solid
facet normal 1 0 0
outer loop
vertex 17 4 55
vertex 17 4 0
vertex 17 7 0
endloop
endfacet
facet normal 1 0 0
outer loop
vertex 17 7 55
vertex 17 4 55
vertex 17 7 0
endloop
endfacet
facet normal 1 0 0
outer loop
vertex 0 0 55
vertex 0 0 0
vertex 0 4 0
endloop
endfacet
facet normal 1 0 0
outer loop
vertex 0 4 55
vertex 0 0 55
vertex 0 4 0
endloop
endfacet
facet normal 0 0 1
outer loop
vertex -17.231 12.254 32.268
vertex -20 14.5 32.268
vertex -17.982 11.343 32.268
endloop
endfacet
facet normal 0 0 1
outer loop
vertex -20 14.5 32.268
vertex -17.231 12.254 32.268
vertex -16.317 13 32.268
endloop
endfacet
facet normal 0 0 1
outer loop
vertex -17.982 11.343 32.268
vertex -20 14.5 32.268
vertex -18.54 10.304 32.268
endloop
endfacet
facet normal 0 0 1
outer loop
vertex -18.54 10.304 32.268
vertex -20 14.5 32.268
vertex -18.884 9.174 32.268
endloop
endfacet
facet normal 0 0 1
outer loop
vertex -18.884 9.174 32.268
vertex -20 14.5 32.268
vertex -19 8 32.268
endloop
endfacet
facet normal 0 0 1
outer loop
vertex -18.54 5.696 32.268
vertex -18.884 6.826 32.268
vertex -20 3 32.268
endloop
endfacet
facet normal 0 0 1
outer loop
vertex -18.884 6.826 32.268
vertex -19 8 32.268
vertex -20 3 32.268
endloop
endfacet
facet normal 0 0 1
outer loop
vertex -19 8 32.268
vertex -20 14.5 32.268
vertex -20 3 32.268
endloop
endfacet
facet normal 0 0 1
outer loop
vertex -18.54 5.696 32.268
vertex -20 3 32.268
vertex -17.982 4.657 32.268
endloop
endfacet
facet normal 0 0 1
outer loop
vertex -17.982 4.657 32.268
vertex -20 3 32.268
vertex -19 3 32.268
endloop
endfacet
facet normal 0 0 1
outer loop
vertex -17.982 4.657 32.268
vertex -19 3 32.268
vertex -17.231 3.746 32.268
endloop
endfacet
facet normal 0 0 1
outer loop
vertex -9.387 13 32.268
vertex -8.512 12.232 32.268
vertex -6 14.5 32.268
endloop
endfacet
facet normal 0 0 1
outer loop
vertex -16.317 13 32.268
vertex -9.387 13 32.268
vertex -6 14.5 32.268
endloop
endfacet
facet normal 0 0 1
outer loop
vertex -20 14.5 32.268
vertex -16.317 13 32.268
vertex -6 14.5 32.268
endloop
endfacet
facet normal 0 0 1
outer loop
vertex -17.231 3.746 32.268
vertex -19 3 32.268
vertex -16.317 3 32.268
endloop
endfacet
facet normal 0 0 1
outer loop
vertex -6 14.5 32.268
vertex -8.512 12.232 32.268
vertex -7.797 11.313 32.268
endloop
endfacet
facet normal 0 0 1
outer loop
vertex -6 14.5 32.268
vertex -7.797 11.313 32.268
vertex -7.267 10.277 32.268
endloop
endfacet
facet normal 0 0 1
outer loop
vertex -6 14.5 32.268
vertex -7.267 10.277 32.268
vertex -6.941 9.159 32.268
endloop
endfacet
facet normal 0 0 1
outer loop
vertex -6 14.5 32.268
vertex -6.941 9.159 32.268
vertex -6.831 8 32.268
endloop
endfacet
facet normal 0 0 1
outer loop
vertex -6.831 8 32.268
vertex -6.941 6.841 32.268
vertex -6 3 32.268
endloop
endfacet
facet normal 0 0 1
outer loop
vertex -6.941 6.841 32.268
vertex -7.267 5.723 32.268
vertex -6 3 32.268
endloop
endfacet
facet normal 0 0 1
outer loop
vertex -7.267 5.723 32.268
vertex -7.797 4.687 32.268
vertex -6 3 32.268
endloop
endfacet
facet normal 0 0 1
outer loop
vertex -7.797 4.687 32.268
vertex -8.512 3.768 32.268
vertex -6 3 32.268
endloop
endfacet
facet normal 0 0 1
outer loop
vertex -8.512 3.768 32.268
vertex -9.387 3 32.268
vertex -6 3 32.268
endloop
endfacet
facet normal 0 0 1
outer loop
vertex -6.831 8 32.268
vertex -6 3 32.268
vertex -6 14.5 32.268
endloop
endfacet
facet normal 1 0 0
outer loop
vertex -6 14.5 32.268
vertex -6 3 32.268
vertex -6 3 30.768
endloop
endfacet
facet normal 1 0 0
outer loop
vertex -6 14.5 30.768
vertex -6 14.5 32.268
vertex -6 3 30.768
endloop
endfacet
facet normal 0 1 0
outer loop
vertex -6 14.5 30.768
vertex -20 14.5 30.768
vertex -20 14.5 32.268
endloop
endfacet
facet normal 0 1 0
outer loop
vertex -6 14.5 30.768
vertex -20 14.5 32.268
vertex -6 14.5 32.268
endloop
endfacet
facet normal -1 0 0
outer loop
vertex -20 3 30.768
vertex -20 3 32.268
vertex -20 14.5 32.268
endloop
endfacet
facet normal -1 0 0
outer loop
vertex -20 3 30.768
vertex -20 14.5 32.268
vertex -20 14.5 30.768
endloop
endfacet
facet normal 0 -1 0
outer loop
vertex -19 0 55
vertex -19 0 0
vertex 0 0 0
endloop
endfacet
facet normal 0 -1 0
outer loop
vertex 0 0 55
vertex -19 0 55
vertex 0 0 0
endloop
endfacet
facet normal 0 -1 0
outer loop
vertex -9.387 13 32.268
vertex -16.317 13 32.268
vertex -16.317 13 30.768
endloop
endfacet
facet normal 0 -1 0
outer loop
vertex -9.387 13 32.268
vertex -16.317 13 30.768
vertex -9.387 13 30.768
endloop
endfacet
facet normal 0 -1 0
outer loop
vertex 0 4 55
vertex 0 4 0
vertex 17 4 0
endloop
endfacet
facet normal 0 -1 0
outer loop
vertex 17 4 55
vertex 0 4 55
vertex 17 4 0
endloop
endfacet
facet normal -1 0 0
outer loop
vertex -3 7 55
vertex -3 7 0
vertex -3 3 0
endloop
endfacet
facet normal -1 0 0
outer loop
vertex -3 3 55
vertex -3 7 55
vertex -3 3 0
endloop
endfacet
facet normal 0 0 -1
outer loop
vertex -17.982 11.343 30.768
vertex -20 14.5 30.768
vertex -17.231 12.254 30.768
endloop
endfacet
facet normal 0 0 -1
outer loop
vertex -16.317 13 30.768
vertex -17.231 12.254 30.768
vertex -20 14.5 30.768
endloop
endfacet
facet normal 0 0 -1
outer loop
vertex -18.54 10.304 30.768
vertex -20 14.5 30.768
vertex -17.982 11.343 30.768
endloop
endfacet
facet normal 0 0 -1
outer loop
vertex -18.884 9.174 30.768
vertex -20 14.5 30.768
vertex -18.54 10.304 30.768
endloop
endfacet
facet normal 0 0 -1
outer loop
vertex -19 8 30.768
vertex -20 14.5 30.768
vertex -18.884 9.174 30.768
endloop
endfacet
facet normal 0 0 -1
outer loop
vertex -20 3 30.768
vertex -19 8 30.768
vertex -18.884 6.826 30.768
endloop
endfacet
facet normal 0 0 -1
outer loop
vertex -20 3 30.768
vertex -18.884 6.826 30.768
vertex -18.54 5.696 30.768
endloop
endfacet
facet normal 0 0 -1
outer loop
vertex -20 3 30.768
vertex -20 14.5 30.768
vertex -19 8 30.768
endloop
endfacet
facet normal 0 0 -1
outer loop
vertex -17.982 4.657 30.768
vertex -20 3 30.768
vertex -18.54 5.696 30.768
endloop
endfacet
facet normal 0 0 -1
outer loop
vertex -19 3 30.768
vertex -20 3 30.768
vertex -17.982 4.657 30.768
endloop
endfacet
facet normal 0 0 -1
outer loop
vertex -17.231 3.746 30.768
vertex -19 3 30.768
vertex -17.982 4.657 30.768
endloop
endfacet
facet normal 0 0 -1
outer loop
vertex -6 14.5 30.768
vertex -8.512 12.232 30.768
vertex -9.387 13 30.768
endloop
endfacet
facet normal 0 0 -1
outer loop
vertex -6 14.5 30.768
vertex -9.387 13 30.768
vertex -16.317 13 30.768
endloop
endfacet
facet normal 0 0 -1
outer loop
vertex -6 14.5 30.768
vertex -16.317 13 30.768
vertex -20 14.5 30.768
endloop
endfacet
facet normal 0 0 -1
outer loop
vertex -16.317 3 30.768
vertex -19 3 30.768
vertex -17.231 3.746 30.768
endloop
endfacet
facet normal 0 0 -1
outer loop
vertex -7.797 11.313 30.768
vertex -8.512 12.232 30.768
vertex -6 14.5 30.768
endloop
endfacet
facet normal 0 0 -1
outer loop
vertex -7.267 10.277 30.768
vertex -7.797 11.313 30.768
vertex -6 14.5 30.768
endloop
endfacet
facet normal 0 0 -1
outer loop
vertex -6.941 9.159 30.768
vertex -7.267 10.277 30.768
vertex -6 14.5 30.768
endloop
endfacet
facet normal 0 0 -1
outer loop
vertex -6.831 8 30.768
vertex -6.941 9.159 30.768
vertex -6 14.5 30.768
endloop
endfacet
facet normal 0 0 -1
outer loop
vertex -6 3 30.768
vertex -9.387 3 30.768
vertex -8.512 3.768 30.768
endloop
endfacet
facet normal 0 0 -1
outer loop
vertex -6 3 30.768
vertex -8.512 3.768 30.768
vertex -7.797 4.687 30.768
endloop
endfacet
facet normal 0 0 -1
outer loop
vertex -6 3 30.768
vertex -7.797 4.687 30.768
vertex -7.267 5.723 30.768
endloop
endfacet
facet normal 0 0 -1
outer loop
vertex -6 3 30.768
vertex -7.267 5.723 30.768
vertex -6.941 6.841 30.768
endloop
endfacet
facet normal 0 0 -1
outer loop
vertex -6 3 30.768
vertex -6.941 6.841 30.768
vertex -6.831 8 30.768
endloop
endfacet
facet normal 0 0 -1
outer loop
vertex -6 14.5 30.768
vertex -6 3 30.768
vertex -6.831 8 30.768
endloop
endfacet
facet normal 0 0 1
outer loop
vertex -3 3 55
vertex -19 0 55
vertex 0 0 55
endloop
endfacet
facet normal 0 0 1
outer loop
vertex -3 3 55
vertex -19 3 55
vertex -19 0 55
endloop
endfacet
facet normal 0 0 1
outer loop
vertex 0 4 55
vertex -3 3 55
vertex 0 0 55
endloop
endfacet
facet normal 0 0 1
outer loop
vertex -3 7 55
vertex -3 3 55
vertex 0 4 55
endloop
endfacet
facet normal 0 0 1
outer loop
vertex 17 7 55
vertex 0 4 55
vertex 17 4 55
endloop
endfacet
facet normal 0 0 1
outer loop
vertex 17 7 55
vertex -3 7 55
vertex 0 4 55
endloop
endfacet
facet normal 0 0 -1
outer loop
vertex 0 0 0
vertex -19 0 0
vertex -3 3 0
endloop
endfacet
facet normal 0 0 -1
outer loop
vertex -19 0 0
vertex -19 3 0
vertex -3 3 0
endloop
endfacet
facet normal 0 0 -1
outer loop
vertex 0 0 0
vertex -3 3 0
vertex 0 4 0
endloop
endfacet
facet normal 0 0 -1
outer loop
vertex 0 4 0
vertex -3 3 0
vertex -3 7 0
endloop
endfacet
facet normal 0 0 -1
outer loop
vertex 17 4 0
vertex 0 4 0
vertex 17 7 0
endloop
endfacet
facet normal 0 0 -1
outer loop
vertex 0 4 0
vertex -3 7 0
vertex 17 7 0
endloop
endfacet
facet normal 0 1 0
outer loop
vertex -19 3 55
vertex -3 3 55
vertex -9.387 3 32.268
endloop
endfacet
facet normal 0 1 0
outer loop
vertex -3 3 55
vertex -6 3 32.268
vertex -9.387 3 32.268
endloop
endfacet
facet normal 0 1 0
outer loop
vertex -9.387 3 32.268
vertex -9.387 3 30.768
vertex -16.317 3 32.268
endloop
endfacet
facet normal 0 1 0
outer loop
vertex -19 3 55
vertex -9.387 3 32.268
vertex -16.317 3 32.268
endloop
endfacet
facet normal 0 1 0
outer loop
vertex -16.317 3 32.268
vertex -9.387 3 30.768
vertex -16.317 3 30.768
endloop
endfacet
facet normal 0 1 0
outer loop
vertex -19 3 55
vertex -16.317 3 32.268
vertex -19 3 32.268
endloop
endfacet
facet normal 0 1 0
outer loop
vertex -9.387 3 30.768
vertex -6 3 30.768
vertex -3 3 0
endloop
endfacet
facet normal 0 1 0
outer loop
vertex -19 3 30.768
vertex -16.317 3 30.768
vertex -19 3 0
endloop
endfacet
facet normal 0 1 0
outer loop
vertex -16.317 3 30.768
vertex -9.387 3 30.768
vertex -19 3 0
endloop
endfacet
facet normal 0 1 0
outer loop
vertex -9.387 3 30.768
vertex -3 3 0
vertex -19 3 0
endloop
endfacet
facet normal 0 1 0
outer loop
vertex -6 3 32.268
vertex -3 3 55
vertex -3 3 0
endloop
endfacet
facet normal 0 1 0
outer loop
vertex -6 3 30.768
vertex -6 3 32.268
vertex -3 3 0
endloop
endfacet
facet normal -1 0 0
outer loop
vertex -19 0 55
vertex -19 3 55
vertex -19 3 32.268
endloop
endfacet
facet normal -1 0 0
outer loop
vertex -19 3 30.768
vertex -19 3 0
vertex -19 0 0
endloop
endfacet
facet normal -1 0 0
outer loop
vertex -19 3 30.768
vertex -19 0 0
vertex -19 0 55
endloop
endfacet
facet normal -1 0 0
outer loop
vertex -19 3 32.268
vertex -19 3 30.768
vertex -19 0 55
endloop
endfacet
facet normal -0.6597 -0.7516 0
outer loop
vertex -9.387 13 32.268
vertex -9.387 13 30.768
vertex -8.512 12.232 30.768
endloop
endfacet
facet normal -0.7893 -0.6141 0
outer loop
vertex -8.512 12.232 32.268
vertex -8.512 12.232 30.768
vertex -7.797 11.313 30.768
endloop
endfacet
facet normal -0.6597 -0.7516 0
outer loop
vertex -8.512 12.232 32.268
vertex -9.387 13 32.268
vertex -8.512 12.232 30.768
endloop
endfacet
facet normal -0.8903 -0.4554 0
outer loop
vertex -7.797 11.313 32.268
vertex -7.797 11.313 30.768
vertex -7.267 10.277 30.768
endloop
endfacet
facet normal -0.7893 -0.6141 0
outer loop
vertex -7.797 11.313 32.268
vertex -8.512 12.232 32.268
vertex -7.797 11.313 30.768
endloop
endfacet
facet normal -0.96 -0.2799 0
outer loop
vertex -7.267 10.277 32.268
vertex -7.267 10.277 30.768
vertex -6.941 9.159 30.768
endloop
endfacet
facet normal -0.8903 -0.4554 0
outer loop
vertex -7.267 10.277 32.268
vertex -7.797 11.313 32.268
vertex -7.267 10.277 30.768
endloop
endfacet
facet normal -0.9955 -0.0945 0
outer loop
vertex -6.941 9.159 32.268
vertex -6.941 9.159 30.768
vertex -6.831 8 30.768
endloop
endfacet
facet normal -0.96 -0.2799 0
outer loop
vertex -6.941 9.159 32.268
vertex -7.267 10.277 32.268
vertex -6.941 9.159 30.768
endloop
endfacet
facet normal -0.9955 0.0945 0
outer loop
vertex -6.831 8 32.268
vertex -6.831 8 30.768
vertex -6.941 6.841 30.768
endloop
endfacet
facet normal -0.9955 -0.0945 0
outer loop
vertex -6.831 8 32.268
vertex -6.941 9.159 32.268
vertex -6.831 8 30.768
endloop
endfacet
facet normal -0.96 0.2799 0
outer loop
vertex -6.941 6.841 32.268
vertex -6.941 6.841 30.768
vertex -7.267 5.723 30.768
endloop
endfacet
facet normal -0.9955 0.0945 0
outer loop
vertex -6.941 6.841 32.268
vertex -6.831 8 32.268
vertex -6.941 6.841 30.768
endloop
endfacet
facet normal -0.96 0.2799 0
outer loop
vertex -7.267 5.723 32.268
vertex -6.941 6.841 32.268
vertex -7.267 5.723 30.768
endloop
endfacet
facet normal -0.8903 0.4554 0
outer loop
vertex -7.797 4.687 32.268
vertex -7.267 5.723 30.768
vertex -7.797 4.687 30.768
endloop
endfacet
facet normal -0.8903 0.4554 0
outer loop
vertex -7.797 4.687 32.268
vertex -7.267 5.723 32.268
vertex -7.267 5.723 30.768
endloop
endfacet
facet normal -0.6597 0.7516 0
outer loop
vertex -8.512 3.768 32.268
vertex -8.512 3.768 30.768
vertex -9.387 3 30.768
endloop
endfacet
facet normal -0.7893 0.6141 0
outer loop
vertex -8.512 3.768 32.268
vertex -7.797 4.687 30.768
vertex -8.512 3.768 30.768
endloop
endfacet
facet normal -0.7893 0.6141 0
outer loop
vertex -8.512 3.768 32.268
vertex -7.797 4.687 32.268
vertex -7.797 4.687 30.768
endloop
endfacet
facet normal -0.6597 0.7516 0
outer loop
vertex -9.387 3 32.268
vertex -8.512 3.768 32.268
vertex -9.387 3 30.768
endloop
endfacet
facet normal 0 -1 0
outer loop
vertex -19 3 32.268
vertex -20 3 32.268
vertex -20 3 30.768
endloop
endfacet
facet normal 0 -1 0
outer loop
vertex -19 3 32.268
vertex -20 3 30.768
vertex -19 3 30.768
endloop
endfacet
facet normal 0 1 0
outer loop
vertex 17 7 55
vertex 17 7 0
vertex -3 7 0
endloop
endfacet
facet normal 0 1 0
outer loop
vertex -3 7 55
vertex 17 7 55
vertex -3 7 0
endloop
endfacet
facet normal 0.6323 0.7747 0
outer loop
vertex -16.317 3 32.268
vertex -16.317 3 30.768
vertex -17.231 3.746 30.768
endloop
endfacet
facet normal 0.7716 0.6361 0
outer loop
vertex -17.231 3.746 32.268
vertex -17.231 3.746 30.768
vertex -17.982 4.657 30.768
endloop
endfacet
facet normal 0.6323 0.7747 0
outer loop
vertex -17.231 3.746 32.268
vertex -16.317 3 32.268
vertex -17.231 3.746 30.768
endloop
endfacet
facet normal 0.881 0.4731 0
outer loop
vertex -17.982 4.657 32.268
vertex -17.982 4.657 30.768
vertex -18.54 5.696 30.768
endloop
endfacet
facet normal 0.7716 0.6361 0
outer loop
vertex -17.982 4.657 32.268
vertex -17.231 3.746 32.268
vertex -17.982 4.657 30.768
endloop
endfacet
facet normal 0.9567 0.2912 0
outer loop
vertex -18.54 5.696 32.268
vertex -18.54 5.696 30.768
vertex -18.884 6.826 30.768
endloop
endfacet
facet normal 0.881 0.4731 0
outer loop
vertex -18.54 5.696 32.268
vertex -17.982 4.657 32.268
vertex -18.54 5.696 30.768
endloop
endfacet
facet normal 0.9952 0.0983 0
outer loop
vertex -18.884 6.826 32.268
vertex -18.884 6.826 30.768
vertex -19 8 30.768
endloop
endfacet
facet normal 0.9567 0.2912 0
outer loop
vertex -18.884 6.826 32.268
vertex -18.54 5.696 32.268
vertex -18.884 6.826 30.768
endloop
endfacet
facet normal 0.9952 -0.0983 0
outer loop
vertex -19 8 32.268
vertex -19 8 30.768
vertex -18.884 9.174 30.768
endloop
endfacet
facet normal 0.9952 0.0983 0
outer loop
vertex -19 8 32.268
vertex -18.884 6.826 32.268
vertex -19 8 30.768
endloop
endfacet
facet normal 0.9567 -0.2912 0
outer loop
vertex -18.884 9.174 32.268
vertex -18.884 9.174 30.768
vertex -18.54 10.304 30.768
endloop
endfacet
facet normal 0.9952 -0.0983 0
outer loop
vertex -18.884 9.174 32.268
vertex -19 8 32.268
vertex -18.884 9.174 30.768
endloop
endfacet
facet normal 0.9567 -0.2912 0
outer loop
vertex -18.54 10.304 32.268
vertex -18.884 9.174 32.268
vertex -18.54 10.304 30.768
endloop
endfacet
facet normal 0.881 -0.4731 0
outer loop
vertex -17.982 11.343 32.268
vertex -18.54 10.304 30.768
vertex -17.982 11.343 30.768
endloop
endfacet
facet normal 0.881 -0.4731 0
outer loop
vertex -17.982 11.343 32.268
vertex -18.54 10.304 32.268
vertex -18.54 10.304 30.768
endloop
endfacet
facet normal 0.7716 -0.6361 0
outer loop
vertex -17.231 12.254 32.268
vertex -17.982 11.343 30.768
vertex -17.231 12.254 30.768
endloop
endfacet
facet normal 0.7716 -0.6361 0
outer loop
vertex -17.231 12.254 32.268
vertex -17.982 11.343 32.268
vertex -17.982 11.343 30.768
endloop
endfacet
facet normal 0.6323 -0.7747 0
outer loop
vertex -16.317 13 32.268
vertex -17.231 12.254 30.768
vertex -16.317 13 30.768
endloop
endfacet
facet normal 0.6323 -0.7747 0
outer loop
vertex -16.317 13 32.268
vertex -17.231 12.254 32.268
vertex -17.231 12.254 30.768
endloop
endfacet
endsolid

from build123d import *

# Parameters (mm, degrees)
AUFSATZ_LINEAR_AUSTRAGEN1_DEPTH = 55
SKIZZE4_W                       = 14
SKIZZE4_H                       = 1.5
AUFSATZ_LINEAR_AUSTRAGEN2_DEPTH = 11.5
SCHNITT_LINEAR_AUSTRAGEN1_DEPTH = 11.5


with BuildPart() as part:
    # Skizze1 → Aufsatz-Linear austragen1 (new body)
    with BuildSketch(Plane.XY):
        Polygon((-19, 0), (0, 0), (0, 4), (17, 4), (17, 7), (-3, 7), (-3, 3), (-19, 3), align=None)
    extrude(amount=AUFSATZ_LINEAR_AUSTRAGEN1_DEPTH)

    # Skizze4 → Aufsatz-Linear austragen2 (add)
    with BuildSketch(Plane(origin=(0, 3, 0), x_dir=(1, 0, 0), z_dir=(0, 1, 0))):
        with Locations((-13, -31.517965139)):
            Rectangle(SKIZZE4_W, SKIZZE4_H)
    extrude(amount=AUFSATZ_LINEAR_AUSTRAGEN2_DEPTH)

    # Skizze7 → Schnitt-Linear austragen1 (cut)
    with BuildSketch(Plane.XY.offset(32.267965139)):
        with BuildLine():
            Line((-9.38702331, 3), (-16.31662479, 3))
            ThreePointArc((-16.31662479, 3), (-19, 8), (-16.31662479, 13))
            Line((-16.31662479, 13), (-9.38702331, 13))
            ThreePointArc((-9.38702331, 13), (-6.831239949, 8), (-9.38702331, 3))
        make_face()
    extrude(amount=-SCHNITT_LINEAR_AUSTRAGEN1_DEPTH, mode=Mode.SUBTRACT)


solid = part.part
